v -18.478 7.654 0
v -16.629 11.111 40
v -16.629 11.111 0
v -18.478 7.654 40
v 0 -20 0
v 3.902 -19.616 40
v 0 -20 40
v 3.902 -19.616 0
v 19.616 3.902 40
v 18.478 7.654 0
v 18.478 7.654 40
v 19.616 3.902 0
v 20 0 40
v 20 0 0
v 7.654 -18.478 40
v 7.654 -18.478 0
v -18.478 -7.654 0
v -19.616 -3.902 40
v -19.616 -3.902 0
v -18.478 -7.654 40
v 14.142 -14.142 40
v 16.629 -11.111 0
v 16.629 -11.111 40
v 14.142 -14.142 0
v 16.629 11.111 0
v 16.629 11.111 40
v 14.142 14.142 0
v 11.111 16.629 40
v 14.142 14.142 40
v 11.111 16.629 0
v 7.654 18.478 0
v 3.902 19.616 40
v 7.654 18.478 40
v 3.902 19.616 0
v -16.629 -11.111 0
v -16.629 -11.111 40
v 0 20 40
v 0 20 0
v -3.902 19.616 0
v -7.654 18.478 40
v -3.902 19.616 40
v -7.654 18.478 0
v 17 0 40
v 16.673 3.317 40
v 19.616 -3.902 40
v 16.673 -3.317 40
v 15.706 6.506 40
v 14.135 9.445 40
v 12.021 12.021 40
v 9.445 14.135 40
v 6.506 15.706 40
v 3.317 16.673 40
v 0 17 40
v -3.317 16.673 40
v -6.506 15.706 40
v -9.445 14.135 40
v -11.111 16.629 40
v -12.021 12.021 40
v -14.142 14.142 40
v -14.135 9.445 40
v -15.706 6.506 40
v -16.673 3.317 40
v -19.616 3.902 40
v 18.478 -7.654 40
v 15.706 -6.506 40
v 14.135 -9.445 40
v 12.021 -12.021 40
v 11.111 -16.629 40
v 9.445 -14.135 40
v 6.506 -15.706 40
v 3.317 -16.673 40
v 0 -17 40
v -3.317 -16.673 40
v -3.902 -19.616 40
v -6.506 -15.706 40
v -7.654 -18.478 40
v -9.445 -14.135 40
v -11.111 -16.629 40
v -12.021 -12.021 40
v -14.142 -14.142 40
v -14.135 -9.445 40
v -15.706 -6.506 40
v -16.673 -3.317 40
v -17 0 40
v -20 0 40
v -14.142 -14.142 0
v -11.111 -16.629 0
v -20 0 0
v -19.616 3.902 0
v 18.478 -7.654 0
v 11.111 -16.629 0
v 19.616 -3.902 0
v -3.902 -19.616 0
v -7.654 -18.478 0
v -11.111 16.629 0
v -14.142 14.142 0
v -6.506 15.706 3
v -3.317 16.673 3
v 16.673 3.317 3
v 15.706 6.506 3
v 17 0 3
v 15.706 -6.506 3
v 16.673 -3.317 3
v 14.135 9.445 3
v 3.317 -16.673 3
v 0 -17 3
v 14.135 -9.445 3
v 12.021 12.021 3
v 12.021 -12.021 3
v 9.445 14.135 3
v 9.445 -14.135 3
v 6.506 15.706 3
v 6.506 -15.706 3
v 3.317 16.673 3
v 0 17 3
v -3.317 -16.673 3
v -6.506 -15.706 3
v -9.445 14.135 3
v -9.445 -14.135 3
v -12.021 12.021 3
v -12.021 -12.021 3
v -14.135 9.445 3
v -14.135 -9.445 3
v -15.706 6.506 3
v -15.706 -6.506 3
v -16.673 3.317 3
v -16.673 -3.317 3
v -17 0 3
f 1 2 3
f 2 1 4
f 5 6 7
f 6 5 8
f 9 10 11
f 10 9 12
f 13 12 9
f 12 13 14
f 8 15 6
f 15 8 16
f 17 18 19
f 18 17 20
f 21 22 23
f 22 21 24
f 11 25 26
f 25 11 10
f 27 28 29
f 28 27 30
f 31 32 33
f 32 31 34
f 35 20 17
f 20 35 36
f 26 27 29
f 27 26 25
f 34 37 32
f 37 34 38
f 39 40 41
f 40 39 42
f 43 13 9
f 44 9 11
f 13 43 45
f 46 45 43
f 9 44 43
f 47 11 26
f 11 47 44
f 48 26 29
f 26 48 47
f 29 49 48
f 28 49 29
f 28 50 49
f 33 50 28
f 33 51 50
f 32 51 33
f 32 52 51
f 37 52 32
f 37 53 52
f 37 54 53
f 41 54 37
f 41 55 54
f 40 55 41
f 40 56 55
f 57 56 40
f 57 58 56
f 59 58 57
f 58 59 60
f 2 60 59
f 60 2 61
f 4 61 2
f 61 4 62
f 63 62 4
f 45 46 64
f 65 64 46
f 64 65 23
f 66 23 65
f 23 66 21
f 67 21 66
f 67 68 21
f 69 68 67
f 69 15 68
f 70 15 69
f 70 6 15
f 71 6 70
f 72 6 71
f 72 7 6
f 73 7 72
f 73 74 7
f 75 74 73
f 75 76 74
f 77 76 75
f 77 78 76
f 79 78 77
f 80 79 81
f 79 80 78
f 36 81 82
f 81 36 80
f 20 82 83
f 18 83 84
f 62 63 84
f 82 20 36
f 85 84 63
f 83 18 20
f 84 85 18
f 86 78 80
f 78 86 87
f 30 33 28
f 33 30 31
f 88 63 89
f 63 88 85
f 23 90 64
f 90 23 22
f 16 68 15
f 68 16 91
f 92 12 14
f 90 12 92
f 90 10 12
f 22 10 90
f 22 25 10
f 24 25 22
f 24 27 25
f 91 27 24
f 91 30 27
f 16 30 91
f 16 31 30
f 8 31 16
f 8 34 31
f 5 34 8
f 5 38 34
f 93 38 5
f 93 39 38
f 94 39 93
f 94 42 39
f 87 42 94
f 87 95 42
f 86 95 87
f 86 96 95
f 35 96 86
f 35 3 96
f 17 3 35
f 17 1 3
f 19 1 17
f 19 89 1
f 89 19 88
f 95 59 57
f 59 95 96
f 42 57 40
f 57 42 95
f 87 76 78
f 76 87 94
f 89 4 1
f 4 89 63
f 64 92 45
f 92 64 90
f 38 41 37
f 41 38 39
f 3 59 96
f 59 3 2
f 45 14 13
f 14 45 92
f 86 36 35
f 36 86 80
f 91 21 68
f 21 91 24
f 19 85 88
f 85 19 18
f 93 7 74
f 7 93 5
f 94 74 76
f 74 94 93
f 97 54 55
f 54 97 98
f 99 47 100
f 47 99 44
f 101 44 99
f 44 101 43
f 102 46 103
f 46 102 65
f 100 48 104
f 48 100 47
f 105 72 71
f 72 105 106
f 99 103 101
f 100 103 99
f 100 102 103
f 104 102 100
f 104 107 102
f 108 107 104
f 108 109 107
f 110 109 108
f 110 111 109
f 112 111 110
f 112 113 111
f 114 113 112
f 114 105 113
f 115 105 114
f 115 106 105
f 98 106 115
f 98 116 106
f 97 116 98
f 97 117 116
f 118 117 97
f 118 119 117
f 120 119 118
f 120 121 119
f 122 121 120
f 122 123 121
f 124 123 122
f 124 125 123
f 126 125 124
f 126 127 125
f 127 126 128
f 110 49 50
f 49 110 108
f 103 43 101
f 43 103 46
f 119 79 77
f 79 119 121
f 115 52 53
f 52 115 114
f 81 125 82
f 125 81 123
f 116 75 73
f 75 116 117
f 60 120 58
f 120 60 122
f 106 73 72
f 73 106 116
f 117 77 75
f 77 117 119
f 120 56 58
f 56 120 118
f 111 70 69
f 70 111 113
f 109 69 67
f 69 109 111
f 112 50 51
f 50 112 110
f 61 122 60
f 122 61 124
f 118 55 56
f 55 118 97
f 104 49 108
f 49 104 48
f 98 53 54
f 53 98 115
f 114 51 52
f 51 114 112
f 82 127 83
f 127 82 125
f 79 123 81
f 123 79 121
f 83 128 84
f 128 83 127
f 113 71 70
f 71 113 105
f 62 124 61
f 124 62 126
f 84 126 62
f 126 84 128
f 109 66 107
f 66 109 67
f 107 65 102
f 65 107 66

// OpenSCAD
// Options
outerRadius = 20;
innerRadius = 17;
height = 40;
floorThickness = 3;

// Tube
difference()
{
    cylinder(height, outerRadius, outerRadius, center=false, $fn = 32);      
    translate([0, 0, floorThickness])
    {
        cylinder(height, innerRadius, innerRadius, center=false, $fn = 32);
    }
}
